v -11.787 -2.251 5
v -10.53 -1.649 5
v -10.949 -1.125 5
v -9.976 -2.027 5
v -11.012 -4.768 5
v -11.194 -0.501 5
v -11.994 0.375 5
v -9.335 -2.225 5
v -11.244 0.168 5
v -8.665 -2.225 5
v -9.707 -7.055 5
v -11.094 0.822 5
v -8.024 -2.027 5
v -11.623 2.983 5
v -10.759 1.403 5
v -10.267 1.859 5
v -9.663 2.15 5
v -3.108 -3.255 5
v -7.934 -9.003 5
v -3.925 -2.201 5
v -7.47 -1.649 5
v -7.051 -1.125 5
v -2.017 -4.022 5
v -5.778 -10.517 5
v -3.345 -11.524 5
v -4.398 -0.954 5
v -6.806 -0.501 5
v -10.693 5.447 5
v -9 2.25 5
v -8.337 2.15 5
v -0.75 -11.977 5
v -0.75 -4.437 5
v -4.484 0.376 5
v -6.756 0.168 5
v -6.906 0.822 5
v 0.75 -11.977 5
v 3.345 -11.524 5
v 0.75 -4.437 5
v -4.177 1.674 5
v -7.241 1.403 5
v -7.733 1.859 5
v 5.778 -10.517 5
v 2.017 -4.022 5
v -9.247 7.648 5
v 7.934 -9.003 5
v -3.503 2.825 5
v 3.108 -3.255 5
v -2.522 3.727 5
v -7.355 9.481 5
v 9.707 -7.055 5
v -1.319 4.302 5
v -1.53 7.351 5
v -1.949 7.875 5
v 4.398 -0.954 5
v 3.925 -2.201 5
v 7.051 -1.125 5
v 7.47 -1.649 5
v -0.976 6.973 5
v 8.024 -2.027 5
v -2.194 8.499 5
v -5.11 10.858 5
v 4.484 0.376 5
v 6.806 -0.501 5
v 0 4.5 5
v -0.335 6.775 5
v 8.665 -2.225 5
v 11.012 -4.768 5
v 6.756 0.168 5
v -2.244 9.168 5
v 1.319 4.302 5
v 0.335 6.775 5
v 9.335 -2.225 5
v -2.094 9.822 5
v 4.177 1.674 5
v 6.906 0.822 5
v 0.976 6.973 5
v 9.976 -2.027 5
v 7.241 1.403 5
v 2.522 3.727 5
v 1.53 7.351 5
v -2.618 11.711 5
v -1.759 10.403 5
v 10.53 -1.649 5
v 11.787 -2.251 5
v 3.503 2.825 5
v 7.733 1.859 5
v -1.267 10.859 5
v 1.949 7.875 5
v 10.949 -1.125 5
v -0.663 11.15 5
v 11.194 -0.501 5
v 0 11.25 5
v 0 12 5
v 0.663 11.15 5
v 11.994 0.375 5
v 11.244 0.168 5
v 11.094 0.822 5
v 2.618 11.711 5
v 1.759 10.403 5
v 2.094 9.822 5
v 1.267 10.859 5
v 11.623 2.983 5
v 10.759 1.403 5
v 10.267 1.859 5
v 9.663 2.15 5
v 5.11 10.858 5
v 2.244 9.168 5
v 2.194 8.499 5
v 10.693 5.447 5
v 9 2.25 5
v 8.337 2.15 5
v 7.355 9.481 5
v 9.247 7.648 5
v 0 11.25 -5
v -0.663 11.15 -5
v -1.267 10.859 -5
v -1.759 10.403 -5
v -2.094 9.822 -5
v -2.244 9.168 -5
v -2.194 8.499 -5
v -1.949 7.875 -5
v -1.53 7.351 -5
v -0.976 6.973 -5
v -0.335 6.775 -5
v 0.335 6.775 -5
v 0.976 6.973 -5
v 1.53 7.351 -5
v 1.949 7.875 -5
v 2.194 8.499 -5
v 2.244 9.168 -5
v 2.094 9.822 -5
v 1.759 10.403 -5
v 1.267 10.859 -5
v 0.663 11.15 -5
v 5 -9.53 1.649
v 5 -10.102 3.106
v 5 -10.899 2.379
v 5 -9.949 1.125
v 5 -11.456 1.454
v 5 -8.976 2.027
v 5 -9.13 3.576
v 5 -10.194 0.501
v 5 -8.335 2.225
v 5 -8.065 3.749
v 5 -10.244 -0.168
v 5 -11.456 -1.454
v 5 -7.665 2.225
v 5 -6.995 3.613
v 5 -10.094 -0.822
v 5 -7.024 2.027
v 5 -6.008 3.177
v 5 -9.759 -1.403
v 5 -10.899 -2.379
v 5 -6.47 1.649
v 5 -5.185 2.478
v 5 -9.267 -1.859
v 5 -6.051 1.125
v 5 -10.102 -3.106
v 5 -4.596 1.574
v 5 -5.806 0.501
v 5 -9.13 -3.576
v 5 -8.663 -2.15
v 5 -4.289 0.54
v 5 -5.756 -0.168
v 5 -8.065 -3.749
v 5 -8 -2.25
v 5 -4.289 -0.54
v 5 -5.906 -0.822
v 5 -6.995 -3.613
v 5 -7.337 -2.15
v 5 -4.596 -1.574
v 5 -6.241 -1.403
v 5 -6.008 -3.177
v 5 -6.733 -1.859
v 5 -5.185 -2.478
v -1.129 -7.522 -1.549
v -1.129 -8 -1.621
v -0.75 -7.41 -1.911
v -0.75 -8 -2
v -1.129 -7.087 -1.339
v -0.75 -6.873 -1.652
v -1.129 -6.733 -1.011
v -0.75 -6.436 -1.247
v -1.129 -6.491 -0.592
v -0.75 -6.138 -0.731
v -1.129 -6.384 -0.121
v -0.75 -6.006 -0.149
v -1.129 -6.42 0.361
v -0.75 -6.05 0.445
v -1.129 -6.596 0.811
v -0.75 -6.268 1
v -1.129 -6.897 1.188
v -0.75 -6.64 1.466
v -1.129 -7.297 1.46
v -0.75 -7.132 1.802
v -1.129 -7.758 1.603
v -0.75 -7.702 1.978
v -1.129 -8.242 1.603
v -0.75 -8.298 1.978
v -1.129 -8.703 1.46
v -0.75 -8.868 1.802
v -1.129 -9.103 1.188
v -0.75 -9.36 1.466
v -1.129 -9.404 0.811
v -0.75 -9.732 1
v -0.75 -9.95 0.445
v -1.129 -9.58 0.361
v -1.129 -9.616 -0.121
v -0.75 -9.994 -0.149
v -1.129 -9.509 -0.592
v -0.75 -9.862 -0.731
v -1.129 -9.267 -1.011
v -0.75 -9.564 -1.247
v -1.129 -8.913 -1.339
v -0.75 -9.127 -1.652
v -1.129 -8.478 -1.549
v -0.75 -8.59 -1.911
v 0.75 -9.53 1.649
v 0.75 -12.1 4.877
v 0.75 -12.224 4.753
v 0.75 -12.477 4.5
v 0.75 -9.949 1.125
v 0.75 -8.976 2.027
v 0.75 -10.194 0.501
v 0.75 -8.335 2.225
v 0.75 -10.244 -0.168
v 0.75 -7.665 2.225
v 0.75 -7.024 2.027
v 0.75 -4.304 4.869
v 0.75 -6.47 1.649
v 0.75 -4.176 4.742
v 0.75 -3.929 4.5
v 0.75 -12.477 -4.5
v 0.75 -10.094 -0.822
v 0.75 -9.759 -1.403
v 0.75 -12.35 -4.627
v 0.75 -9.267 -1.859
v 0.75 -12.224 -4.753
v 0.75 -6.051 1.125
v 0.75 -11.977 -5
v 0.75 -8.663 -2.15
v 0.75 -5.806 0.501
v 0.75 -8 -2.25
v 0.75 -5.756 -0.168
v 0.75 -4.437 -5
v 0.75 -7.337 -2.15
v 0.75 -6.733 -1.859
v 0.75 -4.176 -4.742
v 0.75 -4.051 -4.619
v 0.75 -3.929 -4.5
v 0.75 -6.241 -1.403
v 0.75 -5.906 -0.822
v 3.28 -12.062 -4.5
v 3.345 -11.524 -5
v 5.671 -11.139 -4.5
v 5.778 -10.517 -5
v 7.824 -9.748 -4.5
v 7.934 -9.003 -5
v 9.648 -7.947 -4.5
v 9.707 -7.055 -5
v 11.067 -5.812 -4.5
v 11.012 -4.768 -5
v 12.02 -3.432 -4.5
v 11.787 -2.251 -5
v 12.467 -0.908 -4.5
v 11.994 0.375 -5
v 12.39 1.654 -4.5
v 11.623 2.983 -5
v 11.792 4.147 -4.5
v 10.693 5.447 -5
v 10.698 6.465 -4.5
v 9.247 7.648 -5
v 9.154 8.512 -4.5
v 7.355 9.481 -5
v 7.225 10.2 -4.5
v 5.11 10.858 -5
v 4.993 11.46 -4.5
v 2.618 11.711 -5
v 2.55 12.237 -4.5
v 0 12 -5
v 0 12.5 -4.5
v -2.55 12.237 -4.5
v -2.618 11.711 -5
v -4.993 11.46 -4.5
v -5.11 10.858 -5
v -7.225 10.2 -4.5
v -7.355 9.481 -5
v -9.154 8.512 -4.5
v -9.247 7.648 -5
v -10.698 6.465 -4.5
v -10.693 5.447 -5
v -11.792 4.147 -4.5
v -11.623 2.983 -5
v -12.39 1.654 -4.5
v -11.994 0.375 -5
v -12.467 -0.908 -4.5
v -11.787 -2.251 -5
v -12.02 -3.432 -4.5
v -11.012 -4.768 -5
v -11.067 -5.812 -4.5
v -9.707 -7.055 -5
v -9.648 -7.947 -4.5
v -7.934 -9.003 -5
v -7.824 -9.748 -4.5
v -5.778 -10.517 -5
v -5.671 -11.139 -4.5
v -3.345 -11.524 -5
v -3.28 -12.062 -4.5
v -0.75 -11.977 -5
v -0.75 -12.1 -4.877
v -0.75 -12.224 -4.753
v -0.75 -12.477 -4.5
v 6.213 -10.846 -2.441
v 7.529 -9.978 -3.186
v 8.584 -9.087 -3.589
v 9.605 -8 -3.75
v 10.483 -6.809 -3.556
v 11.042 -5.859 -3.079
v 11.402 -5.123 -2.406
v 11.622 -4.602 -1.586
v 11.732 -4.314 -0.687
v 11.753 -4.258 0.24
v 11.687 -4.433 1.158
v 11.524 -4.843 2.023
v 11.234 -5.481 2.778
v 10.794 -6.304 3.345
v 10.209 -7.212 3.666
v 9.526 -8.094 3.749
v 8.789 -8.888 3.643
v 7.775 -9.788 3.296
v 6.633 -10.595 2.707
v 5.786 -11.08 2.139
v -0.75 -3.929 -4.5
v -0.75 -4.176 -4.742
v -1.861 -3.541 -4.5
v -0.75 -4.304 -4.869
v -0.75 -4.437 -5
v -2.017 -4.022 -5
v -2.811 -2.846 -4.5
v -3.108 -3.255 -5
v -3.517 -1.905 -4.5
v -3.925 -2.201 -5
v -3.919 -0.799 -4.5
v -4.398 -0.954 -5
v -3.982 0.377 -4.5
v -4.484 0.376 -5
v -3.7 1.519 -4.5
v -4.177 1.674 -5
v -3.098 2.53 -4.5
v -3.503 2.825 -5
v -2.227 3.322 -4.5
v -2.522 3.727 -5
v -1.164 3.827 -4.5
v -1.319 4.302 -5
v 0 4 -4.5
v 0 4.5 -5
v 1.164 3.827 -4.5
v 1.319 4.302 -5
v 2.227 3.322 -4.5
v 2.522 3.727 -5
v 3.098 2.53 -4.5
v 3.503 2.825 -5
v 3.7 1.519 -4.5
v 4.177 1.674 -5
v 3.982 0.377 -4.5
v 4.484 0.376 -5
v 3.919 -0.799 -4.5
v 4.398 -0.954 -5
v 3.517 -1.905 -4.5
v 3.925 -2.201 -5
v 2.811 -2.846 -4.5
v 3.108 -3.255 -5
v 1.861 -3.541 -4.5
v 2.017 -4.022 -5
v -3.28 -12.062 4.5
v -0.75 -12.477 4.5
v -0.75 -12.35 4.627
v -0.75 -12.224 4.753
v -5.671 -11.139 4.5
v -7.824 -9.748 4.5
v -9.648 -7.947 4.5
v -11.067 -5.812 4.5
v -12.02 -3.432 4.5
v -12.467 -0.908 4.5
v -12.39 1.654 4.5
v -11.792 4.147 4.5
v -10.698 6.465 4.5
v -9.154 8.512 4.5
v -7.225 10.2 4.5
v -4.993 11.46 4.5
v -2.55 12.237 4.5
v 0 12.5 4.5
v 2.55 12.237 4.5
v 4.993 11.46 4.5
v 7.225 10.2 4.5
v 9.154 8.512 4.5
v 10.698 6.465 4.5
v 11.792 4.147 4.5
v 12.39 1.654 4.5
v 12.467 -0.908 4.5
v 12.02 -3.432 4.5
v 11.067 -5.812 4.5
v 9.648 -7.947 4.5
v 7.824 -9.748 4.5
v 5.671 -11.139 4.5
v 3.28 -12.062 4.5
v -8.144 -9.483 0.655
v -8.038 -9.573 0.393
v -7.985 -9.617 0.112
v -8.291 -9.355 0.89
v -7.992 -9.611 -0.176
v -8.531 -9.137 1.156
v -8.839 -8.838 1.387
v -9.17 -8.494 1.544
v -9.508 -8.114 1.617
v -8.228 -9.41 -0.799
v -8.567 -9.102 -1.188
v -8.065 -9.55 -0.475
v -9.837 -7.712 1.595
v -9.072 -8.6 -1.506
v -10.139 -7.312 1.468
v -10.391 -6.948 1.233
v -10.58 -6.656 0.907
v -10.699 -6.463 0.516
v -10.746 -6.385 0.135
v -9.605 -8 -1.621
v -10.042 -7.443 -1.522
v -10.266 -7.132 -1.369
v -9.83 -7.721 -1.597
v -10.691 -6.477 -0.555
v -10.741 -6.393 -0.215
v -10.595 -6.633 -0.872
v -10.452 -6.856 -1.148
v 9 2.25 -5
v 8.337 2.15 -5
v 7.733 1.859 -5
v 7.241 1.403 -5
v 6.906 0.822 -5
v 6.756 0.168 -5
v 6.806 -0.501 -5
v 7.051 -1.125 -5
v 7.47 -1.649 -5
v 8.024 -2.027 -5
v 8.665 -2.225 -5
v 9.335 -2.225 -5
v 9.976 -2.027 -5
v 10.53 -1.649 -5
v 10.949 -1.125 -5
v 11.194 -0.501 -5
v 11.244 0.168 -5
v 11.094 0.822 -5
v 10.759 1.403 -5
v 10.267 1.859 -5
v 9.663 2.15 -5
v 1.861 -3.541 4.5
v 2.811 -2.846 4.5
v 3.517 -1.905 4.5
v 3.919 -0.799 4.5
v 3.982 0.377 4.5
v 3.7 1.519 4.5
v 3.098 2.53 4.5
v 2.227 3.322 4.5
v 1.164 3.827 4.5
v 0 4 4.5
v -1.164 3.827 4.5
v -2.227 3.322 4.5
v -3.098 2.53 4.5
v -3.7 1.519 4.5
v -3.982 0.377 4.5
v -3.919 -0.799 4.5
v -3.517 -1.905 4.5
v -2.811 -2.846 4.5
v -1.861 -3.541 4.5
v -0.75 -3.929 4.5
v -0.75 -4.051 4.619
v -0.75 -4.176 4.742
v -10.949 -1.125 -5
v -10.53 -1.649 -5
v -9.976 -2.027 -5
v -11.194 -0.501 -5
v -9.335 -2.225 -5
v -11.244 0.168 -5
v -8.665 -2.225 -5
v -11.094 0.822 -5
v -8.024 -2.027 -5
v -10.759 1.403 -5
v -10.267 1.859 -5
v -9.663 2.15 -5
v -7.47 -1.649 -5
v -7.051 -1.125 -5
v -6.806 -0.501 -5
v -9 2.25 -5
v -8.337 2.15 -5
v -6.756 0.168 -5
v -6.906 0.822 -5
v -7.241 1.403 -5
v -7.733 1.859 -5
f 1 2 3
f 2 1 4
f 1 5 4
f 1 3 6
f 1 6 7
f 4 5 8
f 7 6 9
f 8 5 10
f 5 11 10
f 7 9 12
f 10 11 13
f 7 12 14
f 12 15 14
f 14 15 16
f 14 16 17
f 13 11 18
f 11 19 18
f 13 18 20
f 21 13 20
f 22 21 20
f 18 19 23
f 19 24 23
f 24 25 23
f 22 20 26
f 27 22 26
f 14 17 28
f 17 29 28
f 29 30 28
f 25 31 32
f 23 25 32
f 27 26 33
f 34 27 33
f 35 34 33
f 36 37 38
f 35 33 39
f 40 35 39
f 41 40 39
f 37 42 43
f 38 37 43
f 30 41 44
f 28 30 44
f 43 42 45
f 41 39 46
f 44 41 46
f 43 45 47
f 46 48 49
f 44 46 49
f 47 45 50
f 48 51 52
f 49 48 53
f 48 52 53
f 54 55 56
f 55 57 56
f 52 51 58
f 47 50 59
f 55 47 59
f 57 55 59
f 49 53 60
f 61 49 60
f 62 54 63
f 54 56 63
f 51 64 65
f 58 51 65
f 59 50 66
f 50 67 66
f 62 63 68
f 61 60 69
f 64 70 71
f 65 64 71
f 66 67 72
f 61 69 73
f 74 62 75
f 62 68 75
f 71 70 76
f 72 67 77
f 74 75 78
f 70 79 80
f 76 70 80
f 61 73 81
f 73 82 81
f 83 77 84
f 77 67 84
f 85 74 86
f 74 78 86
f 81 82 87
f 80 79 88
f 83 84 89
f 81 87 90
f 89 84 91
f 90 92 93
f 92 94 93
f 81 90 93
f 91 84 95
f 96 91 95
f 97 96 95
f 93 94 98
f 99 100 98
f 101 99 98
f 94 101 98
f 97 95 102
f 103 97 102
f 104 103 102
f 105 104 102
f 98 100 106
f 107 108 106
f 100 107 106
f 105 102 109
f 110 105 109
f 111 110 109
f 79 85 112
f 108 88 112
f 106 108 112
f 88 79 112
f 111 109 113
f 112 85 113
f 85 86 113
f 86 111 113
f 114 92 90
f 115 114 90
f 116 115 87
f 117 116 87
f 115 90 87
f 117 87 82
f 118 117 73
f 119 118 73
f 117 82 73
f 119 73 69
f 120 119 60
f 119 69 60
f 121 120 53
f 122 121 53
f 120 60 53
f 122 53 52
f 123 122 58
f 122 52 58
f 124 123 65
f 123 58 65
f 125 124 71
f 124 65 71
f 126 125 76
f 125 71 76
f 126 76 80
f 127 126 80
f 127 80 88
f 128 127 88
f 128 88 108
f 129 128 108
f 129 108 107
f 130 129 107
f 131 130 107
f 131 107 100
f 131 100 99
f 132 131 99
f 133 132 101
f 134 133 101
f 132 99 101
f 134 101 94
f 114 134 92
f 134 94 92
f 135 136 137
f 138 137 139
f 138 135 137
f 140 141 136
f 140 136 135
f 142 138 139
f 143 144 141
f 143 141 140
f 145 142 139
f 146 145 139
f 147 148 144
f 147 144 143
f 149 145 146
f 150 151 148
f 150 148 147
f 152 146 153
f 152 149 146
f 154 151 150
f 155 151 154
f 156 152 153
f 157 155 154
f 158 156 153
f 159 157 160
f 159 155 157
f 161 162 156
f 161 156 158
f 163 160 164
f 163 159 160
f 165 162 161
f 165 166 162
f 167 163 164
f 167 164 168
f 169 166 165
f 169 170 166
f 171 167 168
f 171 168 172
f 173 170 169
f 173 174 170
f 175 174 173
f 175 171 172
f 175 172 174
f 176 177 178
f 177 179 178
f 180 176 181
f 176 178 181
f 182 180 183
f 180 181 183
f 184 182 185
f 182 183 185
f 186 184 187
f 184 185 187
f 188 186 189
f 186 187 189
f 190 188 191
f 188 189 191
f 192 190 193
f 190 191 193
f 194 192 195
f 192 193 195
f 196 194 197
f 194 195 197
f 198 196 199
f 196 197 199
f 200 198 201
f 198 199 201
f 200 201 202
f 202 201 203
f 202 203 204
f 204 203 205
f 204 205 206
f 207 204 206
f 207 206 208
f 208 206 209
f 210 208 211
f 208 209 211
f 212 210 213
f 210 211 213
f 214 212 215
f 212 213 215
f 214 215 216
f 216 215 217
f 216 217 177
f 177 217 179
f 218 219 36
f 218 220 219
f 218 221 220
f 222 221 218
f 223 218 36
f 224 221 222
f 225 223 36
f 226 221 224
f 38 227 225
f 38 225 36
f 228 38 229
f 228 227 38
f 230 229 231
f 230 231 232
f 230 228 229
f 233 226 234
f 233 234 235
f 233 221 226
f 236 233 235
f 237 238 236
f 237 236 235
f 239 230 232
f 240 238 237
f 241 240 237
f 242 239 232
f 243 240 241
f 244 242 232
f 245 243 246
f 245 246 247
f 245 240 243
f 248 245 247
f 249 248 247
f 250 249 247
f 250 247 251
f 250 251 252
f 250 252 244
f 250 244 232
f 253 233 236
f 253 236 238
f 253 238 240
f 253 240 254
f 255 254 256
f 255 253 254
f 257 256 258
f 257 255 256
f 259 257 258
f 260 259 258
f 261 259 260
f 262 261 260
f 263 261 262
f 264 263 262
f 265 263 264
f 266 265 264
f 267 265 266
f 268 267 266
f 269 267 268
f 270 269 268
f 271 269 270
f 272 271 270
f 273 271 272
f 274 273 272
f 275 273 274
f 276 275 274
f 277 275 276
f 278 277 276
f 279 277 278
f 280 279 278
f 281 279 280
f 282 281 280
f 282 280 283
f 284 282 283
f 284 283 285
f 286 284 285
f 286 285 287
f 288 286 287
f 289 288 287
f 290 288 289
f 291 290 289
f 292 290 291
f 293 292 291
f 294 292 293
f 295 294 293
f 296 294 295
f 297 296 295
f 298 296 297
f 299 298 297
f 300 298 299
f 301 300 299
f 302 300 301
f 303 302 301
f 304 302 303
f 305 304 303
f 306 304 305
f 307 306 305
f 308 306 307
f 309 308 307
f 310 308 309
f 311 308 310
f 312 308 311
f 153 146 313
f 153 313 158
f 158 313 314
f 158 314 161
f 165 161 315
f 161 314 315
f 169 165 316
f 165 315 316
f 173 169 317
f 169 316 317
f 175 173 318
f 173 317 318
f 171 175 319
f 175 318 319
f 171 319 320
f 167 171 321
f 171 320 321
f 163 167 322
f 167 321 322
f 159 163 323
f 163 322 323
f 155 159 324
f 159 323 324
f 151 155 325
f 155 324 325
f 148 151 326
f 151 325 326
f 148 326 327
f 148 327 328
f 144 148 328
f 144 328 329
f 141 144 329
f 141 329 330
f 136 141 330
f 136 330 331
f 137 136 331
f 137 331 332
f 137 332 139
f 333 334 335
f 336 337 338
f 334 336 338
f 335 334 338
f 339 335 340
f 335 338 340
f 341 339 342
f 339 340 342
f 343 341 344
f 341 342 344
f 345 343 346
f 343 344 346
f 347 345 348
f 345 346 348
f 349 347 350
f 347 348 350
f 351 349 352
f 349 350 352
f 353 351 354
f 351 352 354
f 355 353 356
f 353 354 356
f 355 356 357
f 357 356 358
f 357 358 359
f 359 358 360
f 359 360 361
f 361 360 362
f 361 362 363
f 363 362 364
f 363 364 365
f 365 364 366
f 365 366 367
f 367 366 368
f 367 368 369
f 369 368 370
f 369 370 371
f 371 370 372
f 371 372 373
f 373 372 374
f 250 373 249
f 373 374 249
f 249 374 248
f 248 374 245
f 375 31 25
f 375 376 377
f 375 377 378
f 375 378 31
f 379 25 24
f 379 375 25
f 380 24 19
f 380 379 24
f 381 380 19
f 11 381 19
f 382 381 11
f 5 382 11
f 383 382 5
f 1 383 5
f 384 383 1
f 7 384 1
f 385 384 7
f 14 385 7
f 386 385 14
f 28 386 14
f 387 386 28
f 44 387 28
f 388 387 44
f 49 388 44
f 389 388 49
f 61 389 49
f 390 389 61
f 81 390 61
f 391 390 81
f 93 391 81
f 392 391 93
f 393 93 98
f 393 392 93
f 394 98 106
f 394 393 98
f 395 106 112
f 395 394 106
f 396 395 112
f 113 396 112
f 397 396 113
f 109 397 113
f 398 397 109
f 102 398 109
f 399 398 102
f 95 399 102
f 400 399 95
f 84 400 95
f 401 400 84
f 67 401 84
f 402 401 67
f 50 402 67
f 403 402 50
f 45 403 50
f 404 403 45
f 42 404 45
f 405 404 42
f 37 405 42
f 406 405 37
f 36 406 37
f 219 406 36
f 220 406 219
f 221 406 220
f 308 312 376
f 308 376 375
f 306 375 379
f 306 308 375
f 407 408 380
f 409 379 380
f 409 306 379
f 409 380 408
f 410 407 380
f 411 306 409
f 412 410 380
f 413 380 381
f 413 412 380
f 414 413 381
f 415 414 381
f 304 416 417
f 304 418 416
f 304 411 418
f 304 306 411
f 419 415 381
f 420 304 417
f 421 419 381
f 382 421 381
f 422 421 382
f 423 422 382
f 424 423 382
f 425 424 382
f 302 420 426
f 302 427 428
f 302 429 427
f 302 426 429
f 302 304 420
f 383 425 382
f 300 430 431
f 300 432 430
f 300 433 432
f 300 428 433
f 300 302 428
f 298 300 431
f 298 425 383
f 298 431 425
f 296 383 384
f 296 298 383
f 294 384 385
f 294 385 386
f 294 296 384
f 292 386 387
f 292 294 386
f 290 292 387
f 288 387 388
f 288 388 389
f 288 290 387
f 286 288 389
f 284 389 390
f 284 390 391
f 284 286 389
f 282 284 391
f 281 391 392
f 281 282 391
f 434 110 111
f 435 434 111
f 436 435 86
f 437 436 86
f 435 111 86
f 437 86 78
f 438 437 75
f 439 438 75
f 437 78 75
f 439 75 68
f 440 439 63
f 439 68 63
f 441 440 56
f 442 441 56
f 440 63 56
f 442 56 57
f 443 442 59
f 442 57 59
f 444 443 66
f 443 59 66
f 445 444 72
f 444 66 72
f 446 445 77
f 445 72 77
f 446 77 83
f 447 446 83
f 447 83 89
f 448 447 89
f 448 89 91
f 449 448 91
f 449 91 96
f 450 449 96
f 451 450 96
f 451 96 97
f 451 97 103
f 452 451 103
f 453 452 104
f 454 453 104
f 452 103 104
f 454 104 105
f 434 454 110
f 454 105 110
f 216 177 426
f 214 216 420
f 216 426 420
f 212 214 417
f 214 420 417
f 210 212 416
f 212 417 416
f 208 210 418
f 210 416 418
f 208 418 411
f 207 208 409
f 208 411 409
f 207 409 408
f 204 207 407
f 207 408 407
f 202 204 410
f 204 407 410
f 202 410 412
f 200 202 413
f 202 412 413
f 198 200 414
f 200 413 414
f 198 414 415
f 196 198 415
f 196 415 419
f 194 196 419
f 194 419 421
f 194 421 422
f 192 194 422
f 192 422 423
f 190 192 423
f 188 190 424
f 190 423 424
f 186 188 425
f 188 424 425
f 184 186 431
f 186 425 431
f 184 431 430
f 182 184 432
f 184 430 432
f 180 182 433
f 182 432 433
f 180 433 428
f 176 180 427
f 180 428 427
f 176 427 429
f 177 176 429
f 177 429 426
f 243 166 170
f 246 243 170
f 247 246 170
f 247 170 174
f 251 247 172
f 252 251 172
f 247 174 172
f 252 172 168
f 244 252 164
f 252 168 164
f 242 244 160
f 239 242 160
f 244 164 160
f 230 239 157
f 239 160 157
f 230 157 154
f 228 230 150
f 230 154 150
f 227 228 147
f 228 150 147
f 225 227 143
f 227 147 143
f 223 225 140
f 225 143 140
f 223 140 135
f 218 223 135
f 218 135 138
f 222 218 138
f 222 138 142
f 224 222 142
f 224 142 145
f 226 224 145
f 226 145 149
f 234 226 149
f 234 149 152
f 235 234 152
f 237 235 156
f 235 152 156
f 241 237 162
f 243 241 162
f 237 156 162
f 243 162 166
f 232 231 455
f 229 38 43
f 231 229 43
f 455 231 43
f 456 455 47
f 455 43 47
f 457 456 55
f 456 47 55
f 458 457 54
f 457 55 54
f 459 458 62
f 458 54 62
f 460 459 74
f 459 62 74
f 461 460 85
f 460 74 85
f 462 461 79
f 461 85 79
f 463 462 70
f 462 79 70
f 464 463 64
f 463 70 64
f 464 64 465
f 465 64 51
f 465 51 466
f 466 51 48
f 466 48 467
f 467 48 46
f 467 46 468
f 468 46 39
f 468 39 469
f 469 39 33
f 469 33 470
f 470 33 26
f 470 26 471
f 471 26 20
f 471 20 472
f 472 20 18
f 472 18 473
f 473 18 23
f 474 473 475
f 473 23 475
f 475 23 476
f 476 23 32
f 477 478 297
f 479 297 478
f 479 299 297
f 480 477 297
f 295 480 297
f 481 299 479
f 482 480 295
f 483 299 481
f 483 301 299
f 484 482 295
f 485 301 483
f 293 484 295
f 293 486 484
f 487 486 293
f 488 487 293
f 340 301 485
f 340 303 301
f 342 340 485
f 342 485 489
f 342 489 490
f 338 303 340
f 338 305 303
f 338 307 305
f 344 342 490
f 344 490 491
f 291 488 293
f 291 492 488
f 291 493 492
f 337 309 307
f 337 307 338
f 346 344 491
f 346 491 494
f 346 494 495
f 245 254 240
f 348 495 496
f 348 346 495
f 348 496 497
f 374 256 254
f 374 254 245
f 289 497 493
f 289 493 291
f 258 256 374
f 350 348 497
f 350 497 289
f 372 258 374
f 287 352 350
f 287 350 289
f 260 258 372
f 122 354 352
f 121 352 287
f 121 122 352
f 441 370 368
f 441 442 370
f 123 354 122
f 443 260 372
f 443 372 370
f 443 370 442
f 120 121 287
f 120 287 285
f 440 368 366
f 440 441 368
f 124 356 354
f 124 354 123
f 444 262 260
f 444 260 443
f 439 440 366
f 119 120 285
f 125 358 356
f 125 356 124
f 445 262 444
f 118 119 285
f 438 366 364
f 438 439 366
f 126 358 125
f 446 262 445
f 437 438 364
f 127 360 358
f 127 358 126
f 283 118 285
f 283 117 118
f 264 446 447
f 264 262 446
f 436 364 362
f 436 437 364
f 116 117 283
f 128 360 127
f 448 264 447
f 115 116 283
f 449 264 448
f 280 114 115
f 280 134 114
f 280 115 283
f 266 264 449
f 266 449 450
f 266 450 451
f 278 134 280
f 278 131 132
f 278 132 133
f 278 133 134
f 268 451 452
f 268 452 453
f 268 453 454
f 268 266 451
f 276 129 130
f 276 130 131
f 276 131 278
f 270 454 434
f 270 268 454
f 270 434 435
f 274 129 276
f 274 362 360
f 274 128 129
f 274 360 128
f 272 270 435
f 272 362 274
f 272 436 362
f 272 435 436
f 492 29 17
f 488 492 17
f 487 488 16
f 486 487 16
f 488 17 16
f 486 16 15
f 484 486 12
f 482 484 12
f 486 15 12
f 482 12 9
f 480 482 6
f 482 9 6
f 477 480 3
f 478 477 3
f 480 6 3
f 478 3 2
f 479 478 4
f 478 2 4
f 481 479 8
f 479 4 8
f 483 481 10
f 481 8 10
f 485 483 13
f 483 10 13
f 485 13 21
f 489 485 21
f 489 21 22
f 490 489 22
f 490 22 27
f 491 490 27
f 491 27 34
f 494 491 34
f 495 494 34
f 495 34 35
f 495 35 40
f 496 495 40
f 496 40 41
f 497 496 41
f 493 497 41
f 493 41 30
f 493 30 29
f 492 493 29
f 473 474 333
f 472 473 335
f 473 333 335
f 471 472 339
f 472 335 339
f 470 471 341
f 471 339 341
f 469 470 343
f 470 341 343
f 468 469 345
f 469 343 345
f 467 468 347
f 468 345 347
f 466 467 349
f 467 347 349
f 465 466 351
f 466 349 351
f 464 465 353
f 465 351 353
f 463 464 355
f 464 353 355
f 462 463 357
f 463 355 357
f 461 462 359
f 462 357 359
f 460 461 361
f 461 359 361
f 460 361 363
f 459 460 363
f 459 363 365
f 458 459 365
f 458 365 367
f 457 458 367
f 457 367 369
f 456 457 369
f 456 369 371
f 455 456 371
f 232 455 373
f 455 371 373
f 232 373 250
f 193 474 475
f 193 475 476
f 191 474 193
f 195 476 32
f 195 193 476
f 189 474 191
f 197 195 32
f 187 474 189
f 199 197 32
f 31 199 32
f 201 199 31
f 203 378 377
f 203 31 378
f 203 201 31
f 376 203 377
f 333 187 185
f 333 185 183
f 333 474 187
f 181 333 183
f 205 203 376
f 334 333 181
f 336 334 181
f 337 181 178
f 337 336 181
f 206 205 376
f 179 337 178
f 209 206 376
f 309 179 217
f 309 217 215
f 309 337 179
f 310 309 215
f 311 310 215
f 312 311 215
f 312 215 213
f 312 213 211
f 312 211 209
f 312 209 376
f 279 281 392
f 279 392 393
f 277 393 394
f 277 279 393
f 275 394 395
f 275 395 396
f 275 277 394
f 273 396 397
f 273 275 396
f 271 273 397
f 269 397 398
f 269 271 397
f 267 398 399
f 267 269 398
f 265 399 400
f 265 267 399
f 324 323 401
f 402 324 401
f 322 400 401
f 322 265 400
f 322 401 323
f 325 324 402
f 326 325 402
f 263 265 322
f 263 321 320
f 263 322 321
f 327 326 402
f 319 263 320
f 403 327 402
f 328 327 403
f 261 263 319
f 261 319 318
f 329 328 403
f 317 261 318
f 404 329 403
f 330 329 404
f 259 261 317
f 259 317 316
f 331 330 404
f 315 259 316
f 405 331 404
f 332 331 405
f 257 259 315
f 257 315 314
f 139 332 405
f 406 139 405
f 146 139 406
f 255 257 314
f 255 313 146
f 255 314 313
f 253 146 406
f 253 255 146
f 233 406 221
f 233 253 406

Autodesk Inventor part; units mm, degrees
sketch "Sketch_14" plane through (0, 0, 0) normal (1, 0, 0) x (0, 1, 0)
  line L0 (0, -5) -> (0, 5)
  line L1 (0, 5) -> (12, 5)
  line L2 (12, 5) -> (12.5, 4.5)
  line L3 (12.5, 4.5) -> (12.5, -4.5)
  line L4 (12.5, -4.5) -> (12, -5)
  line L5 (12, -5) -> (0, -5)
  line L6 (0, -5) -> (0, 5)
revolve "Revolution1" add sketch "Sketch_14" angle 360 about axis through (0, 0, -5) along (0, 0, -1)
sketch "Sketch_15" plane through (0, 0, 0) normal (1, 0, 0) x (0, 1, 0)
  line L0 (0, -5) -> (0, 5)
  line L1 (0, 5) -> (4.5, 5)
  line L2 (4.5, 5) -> (4, 4.5)
  line L3 (4, 4.5) -> (4, -4.5)
  line L4 (4, -4.5) -> (4.5, -5)
  line L5 (4.5, -5) -> (0, -5)
  line L6 (0, -5) -> (0, 5)
revolve "Revolution2" cut sketch "Sketch_15" angle 360 about axis through (0, 0, -5) along (0, 0, -1)
sketch "Sketch_16" plane through (0, 0, 0) normal (0, 0, 1) x (1, 0, 0)
  arc A0 (-0.75, -13.4792) -> (0.75, -13.4792) centre (0, 0) ccw
  line L0 (0.75, -13.4792) -> (0.75, 0)
  line L1 (0.75, 0) -> (-0.75, 0)
  line L2 (-0.75, 0) -> (-0.75, -13.4792)
extrude "Extrusion1" cut sketch "Sketch_16" along normal mid plane 10
sketch "Sketch4" plane through (0, 0, -5) normal (0, 0, -1) x (-1, 0, 0)
  point P0 (-9, 0)
hole "Hole1" at (9, 0, -5) direction (0, 0, 1) diameter 4.5 depth 10
sketch "Sketch5" plane through (0, 0, -5) normal (0, 0, -1) x (-1, 0, 0)
  point P0 (9, 0)
hole "Hole2" at (-9, 0, -5) direction (0, 0, 1) diameter 4.5 depth 10
sketch "Sketch6" plane through (0, 0, -5) normal (0, 0, -1) x (-1, 0, 0)
  point P0 (0, 9)
hole "Hole3" at (0, 9, -5) direction (0, 0, 1) diameter 4.5 depth 10
sketch "Sketch_23" plane through (0, -8, 0) normal (0, 1, 0) x (1, 0, 0)
  line L0 (12.5, 0) -> (0, 0)
  line L1 (0, 0) -> (0, 2.25)
  line L2 (0, 2.25) -> (5, 2.25)
  line L3 (5, 2.25) -> (5, 3.75)
  line L4 (5, 3.75) -> (12.5, 3.75)
  line L5 (12.5, 3.75) -> (12.5, 0)
  line L6 (12.5, 0) -> (0, 0)
revolve "Revolution3" cut sketch "Sketch_23" angle 360 about axis through (12.5, -8, 0) along (1, 0, 0)
sketch "Sketch8" plane through (-0.75, -11.9765, 5) normal (1, 0, 0) x (0, 0, -1)
  point P0 (5, 3.9765)
hole "Hole4" at (-0.75, -8, 0) direction (-1, 0, 0) diameter 3.242 depth 10.2159 countersink diameter 4 countersink angle 90 thread size "M4x0.7" class "6H" standard "ISO Metric profile"
ref_plane "to_bolt_XY" through (5, -8, 0) normal (1, 0, 0) x (0, 0, -1)
ref_plane "to_bolt_YZ" through (5, -8, 0) normal (0, 0, -1) x (0, 1, 0)
ref_plane "to_bolt_ZX" through (5, -8, 0) normal (0, 1, 0) x (1, 0, 0)
properties part number "SCST8-10b"
